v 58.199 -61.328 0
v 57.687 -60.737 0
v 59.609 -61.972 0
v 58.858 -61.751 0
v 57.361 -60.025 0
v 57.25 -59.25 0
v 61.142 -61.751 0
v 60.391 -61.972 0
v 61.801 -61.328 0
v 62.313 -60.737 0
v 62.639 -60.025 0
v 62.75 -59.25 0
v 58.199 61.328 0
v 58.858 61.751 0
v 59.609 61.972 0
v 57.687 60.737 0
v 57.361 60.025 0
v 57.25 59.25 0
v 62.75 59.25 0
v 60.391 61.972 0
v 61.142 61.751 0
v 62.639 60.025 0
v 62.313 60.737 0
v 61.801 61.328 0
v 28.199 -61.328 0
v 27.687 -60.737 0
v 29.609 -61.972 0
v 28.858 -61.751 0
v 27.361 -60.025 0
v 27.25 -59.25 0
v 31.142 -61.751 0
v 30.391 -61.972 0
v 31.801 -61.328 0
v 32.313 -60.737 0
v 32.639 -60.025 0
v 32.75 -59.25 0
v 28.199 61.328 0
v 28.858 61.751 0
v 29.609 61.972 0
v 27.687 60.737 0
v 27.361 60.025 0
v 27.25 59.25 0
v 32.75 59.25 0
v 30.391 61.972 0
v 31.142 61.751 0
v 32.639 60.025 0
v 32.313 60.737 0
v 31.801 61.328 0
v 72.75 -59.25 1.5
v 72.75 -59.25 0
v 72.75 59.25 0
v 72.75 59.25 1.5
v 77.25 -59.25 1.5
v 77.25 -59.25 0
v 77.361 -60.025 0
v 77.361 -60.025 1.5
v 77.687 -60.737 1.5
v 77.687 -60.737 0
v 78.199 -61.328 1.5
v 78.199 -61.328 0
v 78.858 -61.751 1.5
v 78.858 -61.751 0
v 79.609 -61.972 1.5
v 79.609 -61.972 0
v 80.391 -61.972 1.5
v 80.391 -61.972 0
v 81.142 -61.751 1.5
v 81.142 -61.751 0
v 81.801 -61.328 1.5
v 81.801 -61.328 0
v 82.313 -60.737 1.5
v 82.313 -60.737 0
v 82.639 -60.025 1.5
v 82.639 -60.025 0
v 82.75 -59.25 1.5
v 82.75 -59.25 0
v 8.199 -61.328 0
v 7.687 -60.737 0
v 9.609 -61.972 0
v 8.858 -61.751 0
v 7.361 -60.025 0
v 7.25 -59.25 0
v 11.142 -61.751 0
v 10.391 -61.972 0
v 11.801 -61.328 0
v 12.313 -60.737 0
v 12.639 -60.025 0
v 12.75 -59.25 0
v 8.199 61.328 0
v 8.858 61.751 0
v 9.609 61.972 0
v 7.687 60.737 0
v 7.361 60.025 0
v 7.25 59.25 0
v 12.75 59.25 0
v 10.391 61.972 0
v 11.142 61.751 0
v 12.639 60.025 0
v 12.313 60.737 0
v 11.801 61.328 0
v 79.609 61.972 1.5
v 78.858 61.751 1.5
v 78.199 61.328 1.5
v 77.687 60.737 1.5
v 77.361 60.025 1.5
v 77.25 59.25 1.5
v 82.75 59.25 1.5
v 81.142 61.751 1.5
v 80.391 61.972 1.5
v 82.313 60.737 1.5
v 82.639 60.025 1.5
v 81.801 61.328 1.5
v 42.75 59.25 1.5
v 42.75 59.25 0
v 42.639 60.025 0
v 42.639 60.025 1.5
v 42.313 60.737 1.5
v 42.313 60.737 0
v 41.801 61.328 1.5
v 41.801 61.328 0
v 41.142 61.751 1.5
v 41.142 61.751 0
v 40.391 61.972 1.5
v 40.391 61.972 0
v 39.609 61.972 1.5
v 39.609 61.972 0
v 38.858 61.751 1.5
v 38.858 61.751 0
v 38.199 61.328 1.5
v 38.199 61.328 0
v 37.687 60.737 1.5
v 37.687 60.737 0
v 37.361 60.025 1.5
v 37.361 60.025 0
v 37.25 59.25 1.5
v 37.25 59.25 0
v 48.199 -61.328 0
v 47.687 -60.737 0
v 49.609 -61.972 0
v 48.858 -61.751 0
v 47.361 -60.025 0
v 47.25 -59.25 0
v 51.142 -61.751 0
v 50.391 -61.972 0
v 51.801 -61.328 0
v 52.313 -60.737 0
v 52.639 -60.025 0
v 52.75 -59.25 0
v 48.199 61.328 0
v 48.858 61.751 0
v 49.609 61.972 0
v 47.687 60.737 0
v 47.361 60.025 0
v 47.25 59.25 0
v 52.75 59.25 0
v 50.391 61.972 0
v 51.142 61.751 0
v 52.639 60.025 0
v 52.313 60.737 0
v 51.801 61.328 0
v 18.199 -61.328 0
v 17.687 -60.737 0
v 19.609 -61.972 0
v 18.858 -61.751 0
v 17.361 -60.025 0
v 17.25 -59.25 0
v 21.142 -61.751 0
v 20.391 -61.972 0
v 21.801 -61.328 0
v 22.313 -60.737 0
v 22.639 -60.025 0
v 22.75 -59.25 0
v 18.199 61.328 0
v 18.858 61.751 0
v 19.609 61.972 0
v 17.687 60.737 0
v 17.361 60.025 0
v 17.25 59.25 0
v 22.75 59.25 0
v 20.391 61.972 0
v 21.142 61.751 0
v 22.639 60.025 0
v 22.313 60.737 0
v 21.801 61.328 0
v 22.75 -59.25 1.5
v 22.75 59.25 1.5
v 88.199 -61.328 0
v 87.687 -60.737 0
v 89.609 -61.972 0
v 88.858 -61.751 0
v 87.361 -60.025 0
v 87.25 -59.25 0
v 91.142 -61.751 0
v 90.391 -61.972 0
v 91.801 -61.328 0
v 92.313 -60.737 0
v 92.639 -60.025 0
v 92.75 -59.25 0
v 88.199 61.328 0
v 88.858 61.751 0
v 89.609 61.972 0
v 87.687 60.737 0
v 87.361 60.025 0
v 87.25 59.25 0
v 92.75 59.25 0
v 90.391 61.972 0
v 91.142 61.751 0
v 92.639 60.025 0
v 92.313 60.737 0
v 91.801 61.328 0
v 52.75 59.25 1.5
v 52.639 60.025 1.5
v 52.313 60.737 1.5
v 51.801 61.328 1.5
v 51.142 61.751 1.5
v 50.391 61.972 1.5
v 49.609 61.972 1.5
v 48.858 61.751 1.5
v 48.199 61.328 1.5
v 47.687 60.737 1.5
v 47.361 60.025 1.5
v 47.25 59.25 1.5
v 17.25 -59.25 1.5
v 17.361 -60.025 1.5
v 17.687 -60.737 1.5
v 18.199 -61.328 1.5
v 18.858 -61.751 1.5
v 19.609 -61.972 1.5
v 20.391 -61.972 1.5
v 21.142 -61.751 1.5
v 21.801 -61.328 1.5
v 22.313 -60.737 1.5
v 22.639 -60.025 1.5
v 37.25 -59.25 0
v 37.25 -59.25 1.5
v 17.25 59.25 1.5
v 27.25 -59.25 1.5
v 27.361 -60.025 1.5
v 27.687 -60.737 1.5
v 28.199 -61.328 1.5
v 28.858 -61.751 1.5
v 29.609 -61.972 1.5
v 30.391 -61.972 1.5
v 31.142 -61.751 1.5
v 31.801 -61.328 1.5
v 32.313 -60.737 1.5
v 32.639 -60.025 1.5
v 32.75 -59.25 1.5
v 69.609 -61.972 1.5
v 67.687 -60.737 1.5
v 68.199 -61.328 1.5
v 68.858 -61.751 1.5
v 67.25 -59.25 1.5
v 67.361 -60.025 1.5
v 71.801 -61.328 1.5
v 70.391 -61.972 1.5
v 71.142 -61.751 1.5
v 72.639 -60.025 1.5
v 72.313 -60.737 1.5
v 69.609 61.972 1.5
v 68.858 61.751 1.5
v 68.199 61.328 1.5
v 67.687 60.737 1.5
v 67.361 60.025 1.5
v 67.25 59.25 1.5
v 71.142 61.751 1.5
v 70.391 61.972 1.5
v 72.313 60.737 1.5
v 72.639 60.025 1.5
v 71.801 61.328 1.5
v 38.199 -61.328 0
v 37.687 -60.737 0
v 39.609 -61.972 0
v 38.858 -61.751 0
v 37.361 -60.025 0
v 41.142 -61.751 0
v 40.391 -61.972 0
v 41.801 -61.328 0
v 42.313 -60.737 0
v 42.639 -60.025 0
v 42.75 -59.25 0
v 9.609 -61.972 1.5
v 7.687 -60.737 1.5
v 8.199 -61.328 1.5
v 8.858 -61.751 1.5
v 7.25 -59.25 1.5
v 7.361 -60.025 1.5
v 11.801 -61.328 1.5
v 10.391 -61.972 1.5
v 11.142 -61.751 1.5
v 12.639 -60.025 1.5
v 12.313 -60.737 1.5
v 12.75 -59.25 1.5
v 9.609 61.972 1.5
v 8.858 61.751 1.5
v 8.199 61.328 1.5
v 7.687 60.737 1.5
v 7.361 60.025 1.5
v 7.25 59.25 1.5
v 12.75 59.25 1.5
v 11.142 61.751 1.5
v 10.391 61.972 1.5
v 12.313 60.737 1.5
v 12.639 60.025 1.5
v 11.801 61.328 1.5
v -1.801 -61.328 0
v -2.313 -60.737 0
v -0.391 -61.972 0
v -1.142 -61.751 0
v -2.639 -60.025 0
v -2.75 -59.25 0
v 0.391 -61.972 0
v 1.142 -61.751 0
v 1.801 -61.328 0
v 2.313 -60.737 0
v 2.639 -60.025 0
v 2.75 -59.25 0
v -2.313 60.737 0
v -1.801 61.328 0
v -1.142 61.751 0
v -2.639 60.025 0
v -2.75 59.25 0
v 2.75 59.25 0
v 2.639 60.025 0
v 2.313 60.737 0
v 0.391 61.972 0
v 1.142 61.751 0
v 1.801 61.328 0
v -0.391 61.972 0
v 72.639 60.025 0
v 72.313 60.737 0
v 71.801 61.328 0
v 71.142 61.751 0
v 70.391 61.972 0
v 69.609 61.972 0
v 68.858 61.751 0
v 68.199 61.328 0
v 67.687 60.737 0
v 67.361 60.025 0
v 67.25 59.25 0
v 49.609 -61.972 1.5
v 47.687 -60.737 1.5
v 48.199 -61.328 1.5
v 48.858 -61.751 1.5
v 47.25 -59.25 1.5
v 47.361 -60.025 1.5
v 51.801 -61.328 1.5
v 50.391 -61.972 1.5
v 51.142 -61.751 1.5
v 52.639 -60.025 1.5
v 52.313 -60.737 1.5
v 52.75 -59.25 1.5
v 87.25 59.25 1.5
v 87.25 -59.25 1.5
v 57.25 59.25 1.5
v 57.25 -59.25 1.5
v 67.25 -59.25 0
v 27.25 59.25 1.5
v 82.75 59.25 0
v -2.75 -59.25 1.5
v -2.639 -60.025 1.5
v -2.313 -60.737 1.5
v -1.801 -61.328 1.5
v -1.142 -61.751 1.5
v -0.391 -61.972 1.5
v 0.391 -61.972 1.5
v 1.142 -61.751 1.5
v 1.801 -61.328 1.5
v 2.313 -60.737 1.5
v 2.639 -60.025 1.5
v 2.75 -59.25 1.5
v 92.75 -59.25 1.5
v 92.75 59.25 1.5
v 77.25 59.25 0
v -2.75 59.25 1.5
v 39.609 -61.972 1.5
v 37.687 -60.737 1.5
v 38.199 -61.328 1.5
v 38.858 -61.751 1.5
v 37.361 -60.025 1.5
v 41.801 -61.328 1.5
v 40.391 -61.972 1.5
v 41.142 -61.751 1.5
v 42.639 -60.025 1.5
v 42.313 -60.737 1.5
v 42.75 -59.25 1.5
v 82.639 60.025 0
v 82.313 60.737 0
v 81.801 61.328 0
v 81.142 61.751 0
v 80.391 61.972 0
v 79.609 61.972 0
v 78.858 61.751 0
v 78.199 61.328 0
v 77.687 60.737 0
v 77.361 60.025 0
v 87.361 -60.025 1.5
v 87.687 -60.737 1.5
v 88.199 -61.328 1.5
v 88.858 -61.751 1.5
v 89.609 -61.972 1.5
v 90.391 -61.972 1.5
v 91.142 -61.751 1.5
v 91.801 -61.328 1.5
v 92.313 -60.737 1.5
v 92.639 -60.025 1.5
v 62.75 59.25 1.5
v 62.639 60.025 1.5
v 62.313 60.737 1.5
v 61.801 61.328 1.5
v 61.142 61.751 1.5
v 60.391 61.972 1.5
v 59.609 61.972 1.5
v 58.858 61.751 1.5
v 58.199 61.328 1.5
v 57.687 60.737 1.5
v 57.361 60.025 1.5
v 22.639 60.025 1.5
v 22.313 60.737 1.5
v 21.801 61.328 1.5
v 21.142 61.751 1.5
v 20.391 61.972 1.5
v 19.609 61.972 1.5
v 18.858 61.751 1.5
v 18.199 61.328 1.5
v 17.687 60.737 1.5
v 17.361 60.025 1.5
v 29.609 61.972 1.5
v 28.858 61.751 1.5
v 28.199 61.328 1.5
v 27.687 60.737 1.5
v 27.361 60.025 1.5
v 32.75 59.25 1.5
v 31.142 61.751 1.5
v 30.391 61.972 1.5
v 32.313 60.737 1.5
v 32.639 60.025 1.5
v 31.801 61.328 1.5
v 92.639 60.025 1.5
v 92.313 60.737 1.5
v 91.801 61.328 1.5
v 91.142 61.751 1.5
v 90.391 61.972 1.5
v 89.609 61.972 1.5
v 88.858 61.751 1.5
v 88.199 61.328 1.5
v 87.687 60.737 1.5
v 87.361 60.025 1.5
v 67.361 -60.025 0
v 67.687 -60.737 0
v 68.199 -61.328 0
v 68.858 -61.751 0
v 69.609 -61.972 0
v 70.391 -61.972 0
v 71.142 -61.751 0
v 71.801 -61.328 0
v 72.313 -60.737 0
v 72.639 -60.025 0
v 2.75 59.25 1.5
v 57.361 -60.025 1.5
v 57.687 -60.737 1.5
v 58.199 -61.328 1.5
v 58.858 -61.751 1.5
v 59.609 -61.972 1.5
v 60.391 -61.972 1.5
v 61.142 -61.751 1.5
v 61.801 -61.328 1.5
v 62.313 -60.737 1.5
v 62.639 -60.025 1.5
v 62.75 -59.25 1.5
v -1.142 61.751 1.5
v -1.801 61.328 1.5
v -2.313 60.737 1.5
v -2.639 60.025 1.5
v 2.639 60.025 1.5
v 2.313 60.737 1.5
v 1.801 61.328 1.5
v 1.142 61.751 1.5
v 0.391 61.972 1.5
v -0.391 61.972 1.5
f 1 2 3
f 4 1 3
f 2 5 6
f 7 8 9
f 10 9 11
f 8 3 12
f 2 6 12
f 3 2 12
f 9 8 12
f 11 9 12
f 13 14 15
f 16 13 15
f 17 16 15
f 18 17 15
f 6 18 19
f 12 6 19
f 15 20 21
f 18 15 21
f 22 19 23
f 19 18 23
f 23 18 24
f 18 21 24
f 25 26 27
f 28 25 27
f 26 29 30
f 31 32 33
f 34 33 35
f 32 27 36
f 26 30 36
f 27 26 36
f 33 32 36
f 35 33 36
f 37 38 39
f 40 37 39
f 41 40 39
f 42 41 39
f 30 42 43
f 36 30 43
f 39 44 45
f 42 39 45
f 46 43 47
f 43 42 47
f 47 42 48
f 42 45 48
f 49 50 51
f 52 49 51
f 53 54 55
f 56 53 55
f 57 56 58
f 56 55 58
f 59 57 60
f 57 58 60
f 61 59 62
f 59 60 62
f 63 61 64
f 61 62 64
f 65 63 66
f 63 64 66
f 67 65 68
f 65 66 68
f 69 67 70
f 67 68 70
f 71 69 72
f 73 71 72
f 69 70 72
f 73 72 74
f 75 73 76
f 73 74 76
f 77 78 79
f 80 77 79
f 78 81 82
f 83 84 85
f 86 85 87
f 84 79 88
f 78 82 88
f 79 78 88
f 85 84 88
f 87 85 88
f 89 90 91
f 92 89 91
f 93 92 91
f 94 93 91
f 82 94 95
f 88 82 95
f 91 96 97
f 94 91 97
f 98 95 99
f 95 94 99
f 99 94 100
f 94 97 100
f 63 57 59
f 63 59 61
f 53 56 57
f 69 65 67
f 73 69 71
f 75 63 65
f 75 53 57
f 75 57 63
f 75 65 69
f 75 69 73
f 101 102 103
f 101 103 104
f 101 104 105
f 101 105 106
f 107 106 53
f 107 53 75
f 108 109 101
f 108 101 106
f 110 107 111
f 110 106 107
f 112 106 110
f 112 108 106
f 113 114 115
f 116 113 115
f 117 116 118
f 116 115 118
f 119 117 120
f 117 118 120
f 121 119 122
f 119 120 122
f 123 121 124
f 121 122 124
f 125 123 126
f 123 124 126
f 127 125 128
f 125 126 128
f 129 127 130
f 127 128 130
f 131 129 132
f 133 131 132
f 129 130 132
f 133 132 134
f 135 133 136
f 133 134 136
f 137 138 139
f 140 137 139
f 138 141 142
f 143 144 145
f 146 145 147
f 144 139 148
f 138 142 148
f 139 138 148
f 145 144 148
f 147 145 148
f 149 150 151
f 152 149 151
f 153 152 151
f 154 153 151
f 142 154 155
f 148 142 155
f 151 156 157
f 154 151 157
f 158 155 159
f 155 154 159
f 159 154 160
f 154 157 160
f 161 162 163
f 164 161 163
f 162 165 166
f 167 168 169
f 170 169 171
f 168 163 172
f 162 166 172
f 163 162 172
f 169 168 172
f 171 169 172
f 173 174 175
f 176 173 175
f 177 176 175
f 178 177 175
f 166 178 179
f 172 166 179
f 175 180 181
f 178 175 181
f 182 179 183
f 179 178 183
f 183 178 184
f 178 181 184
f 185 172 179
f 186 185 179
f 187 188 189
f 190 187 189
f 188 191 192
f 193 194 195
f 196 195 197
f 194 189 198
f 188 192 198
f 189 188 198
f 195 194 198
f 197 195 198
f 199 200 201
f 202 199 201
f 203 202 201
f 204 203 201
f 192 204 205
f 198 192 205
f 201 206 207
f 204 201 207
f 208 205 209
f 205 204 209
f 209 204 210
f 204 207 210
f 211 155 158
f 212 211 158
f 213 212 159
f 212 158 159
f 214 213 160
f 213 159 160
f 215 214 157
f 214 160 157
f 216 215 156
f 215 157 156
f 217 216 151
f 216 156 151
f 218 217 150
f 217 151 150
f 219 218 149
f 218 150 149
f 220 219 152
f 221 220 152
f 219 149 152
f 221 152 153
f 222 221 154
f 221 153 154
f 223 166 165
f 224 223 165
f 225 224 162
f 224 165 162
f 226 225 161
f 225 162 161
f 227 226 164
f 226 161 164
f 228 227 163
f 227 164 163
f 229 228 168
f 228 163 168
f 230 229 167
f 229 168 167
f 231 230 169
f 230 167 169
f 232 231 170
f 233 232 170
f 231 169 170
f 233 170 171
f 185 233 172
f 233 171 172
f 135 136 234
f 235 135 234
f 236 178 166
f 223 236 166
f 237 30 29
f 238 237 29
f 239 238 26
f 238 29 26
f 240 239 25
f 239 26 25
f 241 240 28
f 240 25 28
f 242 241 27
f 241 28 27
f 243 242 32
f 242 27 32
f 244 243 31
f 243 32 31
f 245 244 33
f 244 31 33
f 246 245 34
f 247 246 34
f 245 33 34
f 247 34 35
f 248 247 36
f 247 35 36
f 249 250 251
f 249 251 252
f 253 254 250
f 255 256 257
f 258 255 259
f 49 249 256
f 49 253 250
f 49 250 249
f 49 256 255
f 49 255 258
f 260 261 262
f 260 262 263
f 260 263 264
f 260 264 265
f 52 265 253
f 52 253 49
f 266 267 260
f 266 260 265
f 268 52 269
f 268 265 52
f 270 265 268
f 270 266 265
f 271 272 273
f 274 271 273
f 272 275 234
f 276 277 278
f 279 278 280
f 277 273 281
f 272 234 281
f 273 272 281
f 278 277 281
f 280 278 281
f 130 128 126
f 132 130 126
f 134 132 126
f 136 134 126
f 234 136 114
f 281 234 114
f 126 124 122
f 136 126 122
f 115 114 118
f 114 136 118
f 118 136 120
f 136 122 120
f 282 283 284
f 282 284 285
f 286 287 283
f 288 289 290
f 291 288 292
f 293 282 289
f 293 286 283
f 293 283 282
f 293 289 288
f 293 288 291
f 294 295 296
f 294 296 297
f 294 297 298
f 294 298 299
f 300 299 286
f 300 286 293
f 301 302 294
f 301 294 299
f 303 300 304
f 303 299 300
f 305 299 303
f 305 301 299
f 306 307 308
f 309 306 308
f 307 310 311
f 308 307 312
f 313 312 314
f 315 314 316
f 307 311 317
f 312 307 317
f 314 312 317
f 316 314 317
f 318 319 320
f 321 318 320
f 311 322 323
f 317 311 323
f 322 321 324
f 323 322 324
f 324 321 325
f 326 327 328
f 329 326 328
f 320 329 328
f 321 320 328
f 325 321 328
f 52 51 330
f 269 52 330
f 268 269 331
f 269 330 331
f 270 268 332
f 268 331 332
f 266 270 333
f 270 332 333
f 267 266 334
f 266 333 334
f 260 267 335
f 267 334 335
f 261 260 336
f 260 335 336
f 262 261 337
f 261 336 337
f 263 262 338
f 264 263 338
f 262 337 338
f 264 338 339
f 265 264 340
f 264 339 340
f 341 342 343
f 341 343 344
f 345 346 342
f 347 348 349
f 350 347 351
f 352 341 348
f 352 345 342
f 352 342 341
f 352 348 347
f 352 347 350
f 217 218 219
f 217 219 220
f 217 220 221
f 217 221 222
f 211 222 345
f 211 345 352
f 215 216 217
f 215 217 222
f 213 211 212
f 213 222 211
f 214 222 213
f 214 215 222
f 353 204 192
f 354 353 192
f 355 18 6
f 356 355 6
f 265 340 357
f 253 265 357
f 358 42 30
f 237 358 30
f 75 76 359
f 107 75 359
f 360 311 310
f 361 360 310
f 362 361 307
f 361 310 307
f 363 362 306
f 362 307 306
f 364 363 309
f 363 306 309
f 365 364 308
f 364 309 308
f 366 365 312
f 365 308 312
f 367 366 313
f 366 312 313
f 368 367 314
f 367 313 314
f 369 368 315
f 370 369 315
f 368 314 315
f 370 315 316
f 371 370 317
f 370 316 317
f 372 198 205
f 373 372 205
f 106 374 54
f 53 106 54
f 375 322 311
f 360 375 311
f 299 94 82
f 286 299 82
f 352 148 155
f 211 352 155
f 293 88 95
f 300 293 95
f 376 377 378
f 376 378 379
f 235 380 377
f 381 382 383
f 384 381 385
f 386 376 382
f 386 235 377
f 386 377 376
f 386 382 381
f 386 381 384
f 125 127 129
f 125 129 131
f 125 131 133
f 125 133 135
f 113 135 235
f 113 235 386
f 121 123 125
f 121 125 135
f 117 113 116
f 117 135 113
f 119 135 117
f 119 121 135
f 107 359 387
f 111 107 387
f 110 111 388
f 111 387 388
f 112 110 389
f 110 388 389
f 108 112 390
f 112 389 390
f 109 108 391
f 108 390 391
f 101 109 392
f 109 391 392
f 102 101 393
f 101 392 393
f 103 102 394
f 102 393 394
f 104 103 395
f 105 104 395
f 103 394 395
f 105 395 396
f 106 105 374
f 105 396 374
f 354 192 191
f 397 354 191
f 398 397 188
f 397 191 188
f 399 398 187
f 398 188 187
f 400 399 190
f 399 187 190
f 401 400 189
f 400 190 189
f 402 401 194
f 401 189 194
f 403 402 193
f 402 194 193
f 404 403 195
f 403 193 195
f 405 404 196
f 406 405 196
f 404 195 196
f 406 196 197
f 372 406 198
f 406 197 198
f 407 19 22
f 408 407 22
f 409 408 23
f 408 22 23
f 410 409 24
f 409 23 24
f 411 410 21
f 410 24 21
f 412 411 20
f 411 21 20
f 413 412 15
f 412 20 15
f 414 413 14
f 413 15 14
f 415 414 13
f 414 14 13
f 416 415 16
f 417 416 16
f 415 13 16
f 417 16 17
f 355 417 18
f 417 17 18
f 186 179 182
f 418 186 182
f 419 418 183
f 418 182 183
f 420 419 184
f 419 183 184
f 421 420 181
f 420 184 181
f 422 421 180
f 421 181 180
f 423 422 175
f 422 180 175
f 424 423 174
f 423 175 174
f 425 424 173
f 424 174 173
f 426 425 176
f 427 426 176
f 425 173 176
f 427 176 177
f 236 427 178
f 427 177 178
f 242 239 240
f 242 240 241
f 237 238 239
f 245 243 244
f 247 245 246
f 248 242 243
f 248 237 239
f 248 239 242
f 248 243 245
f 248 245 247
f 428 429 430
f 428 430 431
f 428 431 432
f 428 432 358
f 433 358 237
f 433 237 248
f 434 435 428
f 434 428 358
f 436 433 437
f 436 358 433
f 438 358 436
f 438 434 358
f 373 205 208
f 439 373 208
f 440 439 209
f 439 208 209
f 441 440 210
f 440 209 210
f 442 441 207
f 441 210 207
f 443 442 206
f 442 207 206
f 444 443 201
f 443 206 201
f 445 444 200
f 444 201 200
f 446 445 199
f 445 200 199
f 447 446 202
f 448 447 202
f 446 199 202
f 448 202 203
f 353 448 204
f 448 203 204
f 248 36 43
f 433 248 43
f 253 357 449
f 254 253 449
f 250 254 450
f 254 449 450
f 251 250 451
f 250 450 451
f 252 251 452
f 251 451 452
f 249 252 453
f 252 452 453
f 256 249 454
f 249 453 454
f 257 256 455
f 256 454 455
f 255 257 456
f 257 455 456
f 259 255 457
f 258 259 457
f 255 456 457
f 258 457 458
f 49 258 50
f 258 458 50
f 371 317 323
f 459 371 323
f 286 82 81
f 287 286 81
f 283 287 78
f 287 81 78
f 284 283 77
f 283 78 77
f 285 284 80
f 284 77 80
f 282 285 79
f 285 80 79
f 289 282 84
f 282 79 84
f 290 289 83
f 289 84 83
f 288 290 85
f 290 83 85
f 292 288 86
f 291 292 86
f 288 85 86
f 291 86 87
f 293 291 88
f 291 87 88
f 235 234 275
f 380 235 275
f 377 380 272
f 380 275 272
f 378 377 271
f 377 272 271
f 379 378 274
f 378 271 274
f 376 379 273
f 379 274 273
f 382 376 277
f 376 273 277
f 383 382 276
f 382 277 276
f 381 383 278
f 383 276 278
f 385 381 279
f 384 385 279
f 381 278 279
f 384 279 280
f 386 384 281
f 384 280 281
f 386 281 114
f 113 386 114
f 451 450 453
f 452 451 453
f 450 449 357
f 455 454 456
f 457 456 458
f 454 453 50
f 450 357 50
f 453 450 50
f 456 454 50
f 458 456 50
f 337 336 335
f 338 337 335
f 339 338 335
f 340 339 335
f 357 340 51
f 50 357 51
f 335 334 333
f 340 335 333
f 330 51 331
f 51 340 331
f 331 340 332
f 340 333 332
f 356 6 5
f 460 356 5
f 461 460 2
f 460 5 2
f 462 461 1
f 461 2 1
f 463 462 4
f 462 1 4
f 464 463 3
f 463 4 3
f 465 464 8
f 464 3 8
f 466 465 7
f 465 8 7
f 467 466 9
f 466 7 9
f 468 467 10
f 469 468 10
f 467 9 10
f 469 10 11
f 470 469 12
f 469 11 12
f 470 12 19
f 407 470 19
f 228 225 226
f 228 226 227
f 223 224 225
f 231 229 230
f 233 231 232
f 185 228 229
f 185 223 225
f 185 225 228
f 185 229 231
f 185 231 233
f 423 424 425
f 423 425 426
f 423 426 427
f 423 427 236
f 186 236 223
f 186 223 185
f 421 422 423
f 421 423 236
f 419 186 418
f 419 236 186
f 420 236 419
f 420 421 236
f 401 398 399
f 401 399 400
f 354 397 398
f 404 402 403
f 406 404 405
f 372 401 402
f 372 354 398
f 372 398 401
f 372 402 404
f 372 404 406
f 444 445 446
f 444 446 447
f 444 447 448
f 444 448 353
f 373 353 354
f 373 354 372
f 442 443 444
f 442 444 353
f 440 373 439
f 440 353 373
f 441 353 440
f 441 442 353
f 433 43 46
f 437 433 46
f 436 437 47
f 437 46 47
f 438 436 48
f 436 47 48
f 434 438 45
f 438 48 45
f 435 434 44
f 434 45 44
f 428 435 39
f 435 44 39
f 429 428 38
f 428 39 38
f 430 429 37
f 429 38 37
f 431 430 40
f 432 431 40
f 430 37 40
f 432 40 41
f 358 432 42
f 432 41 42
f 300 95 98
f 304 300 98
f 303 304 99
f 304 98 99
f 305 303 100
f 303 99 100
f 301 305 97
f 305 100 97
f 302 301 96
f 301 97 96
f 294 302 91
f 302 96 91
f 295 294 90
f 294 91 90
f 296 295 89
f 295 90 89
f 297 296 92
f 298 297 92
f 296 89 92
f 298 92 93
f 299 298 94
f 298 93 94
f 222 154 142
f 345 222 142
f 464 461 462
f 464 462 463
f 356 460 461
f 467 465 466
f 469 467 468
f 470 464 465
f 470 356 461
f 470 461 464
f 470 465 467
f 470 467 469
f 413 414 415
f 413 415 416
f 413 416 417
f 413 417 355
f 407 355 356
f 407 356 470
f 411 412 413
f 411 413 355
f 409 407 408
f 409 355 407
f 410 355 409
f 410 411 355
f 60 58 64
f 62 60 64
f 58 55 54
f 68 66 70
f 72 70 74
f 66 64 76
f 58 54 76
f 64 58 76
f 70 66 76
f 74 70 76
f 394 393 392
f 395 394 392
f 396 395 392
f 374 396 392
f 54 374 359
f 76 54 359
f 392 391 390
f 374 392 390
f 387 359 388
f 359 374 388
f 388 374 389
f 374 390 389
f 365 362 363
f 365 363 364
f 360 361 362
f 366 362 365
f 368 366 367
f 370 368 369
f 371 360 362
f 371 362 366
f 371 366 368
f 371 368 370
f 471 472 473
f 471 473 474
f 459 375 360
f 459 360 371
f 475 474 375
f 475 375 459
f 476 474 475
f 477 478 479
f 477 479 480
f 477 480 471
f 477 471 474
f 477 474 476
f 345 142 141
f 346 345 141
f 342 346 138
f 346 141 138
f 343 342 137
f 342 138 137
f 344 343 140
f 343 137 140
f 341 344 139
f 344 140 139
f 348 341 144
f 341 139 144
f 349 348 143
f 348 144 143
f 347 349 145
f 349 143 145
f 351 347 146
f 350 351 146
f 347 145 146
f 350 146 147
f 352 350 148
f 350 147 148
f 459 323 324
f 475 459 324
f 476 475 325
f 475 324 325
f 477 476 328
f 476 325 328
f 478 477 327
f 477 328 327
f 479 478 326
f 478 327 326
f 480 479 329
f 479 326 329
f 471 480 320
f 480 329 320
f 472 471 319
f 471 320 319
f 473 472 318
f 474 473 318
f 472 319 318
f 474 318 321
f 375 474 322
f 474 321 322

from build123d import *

# Parameters (mm, degrees)
F1_DEPTH = 1.5


with BuildPart() as f1:
    # F0 (on Top) → F1 (new body)
    with BuildSketch(Plane.XY):
        with BuildLine():
            Line((-2.75, 59.25), (-2.75, -59.25))
            ThreePointArc((-2.75, -59.25), (0, -62), (2.75, -59.25))
            Line((2.75, -59.25), (2.75, 59.25))
            ThreePointArc((2.75, 59.25), (0, 62), (-2.75, 59.25))
        make_face()
        with BuildLine():
            ThreePointArc((7.25, -59.25), (10, -62), (12.75, -59.25))
            Line((12.75, -59.25), (12.75, 59.25))
            ThreePointArc((12.75, 59.25), (10, 62), (7.25, 59.25))
            Line((7.25, 59.25), (7.25, -59.25))
        make_face()
        with BuildLine():
            ThreePointArc((17.25, -59.25), (20, -62), (22.75, -59.25))
            Line((22.75, -59.25), (22.75, 59.25))
            ThreePointArc((22.75, 59.25), (20, 62), (17.25, 59.25))
            Line((17.25, 59.25), (17.25, -59.25))
        make_face()
        with BuildLine():
            ThreePointArc((27.25, -59.25), (30, -62), (32.75, -59.25))
            Line((32.75, -59.25), (32.75, 59.25))
            ThreePointArc((32.75, 59.25), (30, 62), (27.25, 59.25))
            Line((27.25, 59.25), (27.25, -59.25))
        make_face()
        with BuildLine():
            ThreePointArc((37.25, -59.25), (40, -62), (42.75, -59.25))
            Line((42.75, -59.25), (42.75, 59.25))
            ThreePointArc((42.75, 59.25), (40, 62), (37.25, 59.25))
            Line((37.25, 59.25), (37.25, -59.25))
        make_face()
        with BuildLine():
            ThreePointArc((47.25, -59.25), (50, -62), (52.75, -59.25))
            Line((52.75, -59.25), (52.75, 59.25))
            ThreePointArc((52.75, 59.25), (50, 62), (47.25, 59.25))
            Line((47.25, 59.25), (47.25, -59.25))
        make_face()
        with BuildLine():
            ThreePointArc((57.25, -59.25), (60, -62), (62.75, -59.25))
            Line((62.75, -59.25), (62.75, 59.25))
            ThreePointArc((62.75, 59.25), (60, 62), (57.25, 59.25))
            Line((57.25, 59.25), (57.25, -59.25))
        make_face()
        with BuildLine():
            ThreePointArc((67.25, -59.25), (70, -62), (72.75, -59.25))
            Line((72.75, -59.25), (72.75, 59.25))
            ThreePointArc((72.75, 59.25), (70, 62), (67.25, 59.25))
            Line((67.25, 59.25), (67.25, -59.25))
        make_face()
        with BuildLine():
            ThreePointArc((77.25, -59.25), (80, -62), (82.75, -59.25))
            Line((82.75, -59.25), (82.75, 59.25))
            ThreePointArc((82.75, 59.25), (80, 62), (77.25, 59.25))
            Line((77.25, 59.25), (77.25, -59.25))
        make_face()
        with BuildLine():
            ThreePointArc((87.25, -59.25), (90, -62), (92.75, -59.25))
            Line((92.75, -59.25), (92.75, 59.25))
            ThreePointArc((92.75, 59.25), (90, 62), (87.25, 59.25))
            Line((87.25, 59.25), (87.25, -59.25))
        make_face()
    extrude(amount=F1_DEPTH)


solid = f1.part
